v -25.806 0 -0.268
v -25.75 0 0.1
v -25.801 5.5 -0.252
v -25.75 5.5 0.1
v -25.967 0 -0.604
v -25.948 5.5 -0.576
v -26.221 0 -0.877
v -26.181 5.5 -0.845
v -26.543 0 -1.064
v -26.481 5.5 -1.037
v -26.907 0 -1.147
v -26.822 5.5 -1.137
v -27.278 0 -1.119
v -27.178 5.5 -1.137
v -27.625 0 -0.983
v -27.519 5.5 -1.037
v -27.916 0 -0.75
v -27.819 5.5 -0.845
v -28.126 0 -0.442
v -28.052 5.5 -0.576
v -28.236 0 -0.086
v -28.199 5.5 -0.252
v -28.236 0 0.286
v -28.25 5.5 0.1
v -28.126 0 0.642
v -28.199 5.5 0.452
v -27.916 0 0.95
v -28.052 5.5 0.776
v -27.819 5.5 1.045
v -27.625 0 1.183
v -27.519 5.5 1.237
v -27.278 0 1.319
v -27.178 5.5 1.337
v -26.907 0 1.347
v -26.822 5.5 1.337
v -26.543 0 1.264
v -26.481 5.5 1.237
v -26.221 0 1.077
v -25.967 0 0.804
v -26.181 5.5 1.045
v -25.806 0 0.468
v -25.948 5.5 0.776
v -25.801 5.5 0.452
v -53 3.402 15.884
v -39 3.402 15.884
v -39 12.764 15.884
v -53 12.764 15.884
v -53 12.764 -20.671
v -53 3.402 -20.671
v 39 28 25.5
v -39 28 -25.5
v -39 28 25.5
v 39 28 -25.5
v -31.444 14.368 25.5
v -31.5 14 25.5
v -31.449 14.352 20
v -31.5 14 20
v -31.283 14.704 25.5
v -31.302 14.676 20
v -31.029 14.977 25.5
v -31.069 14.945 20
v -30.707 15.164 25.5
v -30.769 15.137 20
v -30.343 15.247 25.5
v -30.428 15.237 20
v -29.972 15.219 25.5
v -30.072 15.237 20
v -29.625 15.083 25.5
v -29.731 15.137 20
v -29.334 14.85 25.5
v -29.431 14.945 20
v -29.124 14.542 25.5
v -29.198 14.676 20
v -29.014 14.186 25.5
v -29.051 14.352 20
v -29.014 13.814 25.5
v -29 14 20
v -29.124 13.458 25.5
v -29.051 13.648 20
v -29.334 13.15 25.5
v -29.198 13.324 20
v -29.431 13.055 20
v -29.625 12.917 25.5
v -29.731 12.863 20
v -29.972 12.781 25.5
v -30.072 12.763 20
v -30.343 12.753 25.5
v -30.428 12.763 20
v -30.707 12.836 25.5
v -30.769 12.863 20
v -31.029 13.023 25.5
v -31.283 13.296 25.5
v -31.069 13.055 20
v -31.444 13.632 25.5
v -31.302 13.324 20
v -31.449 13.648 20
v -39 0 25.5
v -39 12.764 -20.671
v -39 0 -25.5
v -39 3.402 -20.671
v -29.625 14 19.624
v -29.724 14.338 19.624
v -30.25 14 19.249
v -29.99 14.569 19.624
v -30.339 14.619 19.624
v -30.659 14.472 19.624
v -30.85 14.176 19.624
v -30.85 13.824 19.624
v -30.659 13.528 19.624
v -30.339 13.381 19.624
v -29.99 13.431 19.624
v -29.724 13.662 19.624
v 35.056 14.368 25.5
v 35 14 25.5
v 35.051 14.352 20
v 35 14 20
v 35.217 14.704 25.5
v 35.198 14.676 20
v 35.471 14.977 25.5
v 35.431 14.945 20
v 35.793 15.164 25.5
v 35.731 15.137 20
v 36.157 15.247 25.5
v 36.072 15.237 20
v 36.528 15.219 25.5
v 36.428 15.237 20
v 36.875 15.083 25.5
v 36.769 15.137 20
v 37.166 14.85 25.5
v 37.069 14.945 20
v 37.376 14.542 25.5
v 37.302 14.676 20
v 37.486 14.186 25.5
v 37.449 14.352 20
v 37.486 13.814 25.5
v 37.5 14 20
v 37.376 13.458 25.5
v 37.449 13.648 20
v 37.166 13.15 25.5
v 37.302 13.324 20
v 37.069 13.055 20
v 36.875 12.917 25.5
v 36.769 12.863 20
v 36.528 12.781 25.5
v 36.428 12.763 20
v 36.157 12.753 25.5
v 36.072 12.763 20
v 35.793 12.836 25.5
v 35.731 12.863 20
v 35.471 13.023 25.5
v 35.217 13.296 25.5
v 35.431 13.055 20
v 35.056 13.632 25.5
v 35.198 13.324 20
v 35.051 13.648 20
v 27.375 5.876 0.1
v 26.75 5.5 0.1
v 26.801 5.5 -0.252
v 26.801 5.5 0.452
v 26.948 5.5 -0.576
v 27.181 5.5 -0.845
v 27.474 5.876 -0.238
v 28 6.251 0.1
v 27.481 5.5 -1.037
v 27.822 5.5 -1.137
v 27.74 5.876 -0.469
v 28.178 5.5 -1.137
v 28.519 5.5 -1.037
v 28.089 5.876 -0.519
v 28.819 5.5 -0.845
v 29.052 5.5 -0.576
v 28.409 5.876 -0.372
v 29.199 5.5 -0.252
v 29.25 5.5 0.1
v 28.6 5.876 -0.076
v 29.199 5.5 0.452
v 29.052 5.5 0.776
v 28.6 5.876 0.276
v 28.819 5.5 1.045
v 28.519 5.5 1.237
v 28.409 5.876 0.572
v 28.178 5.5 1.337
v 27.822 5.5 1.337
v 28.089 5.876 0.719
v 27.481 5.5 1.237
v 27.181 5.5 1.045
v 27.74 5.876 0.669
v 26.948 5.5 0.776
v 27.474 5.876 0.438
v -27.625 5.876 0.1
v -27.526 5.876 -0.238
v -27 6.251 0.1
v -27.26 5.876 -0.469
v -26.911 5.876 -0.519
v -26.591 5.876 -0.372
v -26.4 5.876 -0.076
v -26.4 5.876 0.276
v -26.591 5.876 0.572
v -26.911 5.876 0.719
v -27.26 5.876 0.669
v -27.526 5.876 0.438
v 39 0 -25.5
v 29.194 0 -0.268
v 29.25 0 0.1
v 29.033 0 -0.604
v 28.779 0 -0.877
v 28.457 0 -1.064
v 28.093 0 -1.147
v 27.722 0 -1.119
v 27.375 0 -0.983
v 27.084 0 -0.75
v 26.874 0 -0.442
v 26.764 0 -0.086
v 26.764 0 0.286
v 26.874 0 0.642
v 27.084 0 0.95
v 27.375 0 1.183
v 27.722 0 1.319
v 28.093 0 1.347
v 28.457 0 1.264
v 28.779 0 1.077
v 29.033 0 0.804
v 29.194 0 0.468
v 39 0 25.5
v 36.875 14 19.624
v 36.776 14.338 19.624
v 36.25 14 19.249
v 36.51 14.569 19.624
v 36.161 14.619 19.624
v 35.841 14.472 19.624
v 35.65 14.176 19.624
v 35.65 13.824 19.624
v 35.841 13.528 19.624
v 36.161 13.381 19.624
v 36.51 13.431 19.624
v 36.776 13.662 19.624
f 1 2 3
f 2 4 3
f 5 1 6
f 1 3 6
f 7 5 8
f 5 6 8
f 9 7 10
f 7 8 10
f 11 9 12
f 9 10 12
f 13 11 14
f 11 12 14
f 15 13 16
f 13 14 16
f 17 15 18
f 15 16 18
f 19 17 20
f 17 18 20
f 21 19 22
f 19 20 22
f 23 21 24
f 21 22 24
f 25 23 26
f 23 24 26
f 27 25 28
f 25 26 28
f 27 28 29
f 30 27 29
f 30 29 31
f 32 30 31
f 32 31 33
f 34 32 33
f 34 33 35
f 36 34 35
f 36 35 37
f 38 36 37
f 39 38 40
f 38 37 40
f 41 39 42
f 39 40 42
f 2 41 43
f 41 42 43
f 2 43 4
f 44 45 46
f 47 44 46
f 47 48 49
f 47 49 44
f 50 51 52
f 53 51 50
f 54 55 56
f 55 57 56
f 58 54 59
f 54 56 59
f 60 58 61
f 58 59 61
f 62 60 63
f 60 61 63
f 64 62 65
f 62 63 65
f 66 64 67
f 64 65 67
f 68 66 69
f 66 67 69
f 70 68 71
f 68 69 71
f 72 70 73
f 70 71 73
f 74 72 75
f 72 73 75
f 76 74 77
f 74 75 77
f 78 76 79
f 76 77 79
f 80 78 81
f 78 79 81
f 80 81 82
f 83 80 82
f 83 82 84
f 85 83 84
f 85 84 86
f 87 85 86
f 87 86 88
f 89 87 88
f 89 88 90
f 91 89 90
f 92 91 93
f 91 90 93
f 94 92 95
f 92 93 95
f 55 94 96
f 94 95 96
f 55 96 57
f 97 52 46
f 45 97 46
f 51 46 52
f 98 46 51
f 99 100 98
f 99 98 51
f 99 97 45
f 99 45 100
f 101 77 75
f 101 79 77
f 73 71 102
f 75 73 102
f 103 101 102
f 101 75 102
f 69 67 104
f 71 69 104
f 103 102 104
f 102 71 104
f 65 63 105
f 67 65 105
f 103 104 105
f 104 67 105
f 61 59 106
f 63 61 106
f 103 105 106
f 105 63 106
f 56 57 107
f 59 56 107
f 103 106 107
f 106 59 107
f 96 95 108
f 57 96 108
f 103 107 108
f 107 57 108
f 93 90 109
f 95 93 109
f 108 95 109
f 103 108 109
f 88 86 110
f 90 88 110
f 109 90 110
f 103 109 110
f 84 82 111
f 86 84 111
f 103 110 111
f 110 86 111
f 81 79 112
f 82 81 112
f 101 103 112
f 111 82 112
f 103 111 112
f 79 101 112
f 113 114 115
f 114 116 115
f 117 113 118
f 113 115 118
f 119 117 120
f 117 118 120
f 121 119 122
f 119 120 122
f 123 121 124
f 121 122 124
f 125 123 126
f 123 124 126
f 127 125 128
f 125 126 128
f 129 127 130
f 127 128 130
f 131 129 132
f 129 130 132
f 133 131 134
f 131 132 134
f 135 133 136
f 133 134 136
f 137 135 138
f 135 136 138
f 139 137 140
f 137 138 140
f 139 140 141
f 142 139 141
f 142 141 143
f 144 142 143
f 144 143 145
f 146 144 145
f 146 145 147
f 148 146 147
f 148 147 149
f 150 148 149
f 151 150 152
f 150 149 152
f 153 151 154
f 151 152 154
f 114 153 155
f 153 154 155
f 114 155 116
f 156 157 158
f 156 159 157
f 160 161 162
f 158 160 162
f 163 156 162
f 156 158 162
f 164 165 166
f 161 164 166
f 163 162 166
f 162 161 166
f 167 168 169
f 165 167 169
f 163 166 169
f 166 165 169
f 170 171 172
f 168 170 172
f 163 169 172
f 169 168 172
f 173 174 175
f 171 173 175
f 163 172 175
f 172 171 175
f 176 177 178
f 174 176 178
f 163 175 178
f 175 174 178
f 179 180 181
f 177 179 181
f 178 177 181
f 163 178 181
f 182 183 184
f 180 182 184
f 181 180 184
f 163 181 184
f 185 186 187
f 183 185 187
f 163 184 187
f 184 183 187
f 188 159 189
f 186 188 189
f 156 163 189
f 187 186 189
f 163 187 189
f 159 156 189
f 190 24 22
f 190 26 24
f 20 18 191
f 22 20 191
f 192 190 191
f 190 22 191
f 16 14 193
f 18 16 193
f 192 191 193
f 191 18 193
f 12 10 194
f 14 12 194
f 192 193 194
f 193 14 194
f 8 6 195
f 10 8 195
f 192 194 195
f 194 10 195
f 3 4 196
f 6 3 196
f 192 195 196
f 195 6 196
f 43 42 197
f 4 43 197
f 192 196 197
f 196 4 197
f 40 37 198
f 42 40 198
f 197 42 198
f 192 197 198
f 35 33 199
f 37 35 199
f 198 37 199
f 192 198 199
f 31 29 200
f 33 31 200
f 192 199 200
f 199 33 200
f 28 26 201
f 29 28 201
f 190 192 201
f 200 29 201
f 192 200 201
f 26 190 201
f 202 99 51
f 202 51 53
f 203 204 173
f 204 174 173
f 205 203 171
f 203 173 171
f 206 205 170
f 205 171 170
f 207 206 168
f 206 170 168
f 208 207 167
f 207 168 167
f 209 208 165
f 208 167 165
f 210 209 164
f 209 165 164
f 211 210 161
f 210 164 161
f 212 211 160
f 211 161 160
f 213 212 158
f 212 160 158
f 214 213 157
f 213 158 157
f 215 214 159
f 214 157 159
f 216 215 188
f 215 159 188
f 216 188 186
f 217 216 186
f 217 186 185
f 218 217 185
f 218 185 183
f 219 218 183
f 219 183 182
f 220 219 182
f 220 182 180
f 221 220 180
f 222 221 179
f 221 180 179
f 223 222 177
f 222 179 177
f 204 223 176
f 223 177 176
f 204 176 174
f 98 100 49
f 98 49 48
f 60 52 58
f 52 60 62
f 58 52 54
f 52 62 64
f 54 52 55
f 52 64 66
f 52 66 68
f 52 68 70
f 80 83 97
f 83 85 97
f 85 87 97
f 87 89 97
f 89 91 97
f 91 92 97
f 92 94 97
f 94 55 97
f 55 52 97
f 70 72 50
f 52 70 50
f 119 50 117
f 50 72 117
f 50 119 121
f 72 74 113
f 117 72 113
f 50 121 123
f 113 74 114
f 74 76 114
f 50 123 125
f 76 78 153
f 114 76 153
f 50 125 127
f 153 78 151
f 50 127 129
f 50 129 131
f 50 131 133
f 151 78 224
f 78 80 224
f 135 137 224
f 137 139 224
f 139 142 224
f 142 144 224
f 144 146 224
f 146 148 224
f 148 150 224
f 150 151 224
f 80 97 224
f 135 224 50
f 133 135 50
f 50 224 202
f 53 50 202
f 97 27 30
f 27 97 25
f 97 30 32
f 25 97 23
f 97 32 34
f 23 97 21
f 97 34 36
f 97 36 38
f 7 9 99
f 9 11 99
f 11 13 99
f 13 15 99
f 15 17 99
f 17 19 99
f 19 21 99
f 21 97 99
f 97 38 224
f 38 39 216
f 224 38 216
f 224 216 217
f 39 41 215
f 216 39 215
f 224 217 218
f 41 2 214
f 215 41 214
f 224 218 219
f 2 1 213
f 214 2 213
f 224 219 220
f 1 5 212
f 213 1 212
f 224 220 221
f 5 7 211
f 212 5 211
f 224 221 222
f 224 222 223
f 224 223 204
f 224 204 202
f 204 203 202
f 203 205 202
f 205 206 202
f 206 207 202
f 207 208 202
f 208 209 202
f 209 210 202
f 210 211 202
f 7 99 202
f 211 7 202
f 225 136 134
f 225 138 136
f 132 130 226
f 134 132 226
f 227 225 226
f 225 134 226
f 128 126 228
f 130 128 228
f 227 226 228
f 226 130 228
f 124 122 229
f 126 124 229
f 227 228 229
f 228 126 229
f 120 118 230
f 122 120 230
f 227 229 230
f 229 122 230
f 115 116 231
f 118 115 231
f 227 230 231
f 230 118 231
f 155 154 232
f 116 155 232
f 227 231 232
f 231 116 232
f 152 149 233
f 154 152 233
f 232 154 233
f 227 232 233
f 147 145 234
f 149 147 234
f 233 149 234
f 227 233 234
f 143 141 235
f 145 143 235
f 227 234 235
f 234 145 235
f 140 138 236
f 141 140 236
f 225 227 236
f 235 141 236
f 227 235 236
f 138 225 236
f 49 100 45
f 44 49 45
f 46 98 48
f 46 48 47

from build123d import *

# Parameters (mm, degrees)
SKETCH_1_W            = 78
SKETCH_1_H            = 51
EXTRUDE_1_DEPTH       = 28
HOLE_WIZARD_M31_D     = 2.5
HOLE_WIZARD_M31_DEPTH = 5.5
HOLE_WIZARD_M31_TIP   = 0.751075774
HOLE_WIZARD_M32_D     = 2.5
HOLE_WIZARD_M32_DEPTH = 5.5
HOLE_WIZARD_M32_TIP   = 0.751075774
SKETCH_6_W            = 36.55514342
SKETCH_6_H            = 9.362324501
EXTRUDE_2_DEPTH       = 14


with BuildPart() as part:
    # Эскиз1 → Бобышка-Вытянуть1 (new body)
    with BuildSketch(Plane(origin=(0, 0, 0), x_dir=(1, 0, 0), z_dir=(0, 1, 0))):
        Rectangle(SKETCH_1_W, SKETCH_1_H)
    extrude(amount=EXTRUDE_1_DEPTH)

    # Отверстие обработанное метчиком M31
    with Locations(Plane.XY.offset(25.5)):
        with Locations((36.25, 14), (-30.25, 14)):
            Hole(HOLE_WIZARD_M31_D / 2, depth=HOLE_WIZARD_M31_DEPTH)
            with Locations((0, 0, -(HOLE_WIZARD_M31_DEPTH + HOLE_WIZARD_M31_TIP / 2))):  # 118° drill point
                Cone(0, HOLE_WIZARD_M31_D / 2, HOLE_WIZARD_M31_TIP, mode=Mode.SUBTRACT)

    # Отверстие обработанное метчиком M32
    with Locations(Plane(origin=(0, 0, 0), x_dir=(-1, 0, 0), z_dir=(0, -1, 0))):
        with Locations((-28, -0.1), (27, -0.1)):
            Hole(HOLE_WIZARD_M32_D / 2, depth=HOLE_WIZARD_M32_DEPTH)
            with Locations((0, 0, -(HOLE_WIZARD_M32_DEPTH + HOLE_WIZARD_M32_TIP / 2))):  # 118° drill point
                Cone(0, HOLE_WIZARD_M32_D / 2, HOLE_WIZARD_M32_TIP, mode=Mode.SUBTRACT)

    # Эскиз6 → Бобышка-Вытянуть2 (add)
    with BuildSketch(Plane.ZY.offset(39)):
        with Locations((-2.393178454, 8.082800526)):
            Rectangle(SKETCH_6_W, SKETCH_6_H)
    extrude(amount=EXTRUDE_2_DEPTH)


solid = part.part
